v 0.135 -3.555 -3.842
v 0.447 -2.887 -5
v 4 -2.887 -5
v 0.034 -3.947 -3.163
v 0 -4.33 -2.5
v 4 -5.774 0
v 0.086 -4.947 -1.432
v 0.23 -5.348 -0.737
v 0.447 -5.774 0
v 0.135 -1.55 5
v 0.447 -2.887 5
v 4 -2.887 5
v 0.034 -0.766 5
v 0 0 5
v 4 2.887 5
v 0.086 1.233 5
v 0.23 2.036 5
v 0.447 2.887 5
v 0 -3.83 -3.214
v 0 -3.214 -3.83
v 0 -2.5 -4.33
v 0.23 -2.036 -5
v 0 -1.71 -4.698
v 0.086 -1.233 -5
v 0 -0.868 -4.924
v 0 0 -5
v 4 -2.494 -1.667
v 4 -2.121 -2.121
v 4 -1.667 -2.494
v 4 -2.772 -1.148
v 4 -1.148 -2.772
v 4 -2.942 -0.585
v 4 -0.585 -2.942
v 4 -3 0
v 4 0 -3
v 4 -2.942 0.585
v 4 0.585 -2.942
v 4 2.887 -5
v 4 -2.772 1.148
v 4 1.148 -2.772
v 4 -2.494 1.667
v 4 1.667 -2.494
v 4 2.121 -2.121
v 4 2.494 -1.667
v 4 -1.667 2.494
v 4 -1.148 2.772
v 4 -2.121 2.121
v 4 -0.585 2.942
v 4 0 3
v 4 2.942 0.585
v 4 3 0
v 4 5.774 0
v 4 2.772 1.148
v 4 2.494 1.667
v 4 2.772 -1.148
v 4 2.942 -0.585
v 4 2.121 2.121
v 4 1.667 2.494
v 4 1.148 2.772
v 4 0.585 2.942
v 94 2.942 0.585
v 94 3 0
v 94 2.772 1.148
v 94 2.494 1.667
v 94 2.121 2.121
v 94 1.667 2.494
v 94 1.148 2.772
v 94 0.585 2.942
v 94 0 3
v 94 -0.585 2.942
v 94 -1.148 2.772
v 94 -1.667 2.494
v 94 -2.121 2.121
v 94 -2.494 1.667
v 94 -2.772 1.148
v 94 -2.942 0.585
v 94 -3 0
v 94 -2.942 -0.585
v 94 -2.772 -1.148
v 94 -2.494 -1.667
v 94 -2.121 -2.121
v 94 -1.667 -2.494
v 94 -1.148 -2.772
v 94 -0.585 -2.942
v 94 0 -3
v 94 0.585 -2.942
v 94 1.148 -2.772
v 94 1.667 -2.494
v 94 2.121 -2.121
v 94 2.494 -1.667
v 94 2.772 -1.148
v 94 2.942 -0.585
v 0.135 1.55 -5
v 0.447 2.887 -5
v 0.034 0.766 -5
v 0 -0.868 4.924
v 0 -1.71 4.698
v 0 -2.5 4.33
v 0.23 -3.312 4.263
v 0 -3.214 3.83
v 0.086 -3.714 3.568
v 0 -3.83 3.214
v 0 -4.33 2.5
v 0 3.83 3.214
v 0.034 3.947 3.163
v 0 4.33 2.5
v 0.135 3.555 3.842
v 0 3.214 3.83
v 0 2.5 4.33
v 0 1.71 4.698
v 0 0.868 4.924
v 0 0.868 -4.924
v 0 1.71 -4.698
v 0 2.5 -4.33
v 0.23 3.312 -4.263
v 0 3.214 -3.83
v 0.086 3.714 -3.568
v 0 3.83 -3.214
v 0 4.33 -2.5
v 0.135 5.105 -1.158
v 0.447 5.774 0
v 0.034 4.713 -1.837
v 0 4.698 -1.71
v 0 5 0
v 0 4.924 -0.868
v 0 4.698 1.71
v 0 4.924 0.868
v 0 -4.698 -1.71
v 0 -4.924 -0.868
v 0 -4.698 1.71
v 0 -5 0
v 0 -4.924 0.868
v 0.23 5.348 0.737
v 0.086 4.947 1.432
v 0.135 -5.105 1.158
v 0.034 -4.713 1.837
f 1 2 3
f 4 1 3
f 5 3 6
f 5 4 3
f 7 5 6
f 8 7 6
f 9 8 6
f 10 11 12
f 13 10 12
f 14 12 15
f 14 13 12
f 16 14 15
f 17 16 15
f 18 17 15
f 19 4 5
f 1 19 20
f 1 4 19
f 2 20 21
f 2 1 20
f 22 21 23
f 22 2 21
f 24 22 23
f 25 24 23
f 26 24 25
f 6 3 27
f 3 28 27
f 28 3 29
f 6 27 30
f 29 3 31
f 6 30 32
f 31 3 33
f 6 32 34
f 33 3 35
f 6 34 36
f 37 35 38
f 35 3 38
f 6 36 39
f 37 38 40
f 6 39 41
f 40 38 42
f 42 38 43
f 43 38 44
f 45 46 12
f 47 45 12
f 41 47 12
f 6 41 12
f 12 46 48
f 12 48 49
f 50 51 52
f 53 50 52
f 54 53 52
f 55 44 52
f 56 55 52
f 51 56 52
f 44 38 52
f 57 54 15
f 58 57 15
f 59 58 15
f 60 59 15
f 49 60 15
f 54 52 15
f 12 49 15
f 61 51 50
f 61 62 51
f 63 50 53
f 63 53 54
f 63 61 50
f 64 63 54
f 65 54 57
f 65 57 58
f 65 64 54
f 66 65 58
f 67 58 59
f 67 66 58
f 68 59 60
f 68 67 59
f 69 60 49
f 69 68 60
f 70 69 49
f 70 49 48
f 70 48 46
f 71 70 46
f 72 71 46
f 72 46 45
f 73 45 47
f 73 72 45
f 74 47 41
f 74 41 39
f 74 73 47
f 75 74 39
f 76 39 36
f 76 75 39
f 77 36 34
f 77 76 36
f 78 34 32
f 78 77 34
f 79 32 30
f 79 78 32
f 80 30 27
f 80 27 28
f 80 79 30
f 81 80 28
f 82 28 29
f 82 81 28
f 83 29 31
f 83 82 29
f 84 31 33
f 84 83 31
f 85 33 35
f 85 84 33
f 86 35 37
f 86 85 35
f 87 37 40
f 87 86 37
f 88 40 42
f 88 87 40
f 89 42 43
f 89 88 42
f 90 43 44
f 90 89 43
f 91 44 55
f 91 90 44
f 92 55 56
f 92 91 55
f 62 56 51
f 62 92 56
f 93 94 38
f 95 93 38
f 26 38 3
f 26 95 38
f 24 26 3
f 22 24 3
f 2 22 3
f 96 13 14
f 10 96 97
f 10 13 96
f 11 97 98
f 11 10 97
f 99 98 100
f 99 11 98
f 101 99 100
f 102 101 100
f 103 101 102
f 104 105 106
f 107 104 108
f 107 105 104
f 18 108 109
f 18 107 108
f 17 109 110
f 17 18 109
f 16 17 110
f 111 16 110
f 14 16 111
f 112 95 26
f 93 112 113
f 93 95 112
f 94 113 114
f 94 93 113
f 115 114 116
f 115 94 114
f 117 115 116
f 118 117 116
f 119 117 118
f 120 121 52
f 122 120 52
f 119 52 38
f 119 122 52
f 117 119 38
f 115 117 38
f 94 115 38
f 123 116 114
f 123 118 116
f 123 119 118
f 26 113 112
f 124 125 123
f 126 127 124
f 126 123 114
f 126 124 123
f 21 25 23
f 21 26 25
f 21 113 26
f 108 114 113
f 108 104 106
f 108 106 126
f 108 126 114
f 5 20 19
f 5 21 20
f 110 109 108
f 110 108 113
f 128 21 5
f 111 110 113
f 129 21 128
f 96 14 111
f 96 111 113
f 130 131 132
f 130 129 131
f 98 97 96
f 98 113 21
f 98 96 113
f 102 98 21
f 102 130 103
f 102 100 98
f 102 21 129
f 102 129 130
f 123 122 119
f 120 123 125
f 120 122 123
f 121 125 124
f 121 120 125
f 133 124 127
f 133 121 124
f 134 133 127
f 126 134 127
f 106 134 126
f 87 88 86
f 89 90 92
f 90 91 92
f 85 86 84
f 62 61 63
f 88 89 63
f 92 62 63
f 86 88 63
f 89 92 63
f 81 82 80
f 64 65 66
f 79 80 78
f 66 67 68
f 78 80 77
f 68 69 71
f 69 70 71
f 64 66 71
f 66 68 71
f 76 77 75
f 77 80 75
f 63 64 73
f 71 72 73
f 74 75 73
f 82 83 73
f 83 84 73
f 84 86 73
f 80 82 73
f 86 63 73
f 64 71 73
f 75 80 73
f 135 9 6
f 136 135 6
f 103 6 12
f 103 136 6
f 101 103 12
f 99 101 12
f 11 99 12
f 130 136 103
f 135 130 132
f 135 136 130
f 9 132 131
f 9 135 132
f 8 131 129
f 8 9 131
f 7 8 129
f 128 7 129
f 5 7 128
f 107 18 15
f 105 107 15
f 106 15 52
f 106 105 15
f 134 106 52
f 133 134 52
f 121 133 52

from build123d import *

# Parameters (mm, degrees)
BASEHEAD_DEPTH = 4
BODYSKE_W      = 94
BODYSKE_H      = 3


with BuildPart() as part:
    # Sketch1 → BaseHead (new body)
    with BuildSketch(Plane(origin=(0, 0, 0), x_dir=(0, 0, -1), z_dir=(1, 0, 0))):
        Polygon((5, 2.886751346), (5, -2.886751346), (0, -5.773502692), (-5, -2.886751346), (-5, 2.886751346), (0, 5.773502692), align=None)
    extrude(amount=BASEHEAD_DEPTH)

    # BodySke → BaseBody (revolve)
    with BuildSketch(Plane.XY):
        with Locations((47, 1.5)):
            Rectangle(BODYSKE_W, BODYSKE_H)
    revolve(axis=Axis((0, 0, 0), (1, 0, 0)))

    # Sketch3 → HeadChamfer (revolve, cut)
    with BuildSketch(Plane.XY):
        Polygon((0, 5), (3.333333333, 10.773502692), (3.333333333, 15.773502692), (-10, 15.773502692), (-10, 5), align=None)
    revolve(axis=Axis((0, 0, 0), (1, 0, 0)), mode=Mode.SUBTRACT)


solid = part.part
